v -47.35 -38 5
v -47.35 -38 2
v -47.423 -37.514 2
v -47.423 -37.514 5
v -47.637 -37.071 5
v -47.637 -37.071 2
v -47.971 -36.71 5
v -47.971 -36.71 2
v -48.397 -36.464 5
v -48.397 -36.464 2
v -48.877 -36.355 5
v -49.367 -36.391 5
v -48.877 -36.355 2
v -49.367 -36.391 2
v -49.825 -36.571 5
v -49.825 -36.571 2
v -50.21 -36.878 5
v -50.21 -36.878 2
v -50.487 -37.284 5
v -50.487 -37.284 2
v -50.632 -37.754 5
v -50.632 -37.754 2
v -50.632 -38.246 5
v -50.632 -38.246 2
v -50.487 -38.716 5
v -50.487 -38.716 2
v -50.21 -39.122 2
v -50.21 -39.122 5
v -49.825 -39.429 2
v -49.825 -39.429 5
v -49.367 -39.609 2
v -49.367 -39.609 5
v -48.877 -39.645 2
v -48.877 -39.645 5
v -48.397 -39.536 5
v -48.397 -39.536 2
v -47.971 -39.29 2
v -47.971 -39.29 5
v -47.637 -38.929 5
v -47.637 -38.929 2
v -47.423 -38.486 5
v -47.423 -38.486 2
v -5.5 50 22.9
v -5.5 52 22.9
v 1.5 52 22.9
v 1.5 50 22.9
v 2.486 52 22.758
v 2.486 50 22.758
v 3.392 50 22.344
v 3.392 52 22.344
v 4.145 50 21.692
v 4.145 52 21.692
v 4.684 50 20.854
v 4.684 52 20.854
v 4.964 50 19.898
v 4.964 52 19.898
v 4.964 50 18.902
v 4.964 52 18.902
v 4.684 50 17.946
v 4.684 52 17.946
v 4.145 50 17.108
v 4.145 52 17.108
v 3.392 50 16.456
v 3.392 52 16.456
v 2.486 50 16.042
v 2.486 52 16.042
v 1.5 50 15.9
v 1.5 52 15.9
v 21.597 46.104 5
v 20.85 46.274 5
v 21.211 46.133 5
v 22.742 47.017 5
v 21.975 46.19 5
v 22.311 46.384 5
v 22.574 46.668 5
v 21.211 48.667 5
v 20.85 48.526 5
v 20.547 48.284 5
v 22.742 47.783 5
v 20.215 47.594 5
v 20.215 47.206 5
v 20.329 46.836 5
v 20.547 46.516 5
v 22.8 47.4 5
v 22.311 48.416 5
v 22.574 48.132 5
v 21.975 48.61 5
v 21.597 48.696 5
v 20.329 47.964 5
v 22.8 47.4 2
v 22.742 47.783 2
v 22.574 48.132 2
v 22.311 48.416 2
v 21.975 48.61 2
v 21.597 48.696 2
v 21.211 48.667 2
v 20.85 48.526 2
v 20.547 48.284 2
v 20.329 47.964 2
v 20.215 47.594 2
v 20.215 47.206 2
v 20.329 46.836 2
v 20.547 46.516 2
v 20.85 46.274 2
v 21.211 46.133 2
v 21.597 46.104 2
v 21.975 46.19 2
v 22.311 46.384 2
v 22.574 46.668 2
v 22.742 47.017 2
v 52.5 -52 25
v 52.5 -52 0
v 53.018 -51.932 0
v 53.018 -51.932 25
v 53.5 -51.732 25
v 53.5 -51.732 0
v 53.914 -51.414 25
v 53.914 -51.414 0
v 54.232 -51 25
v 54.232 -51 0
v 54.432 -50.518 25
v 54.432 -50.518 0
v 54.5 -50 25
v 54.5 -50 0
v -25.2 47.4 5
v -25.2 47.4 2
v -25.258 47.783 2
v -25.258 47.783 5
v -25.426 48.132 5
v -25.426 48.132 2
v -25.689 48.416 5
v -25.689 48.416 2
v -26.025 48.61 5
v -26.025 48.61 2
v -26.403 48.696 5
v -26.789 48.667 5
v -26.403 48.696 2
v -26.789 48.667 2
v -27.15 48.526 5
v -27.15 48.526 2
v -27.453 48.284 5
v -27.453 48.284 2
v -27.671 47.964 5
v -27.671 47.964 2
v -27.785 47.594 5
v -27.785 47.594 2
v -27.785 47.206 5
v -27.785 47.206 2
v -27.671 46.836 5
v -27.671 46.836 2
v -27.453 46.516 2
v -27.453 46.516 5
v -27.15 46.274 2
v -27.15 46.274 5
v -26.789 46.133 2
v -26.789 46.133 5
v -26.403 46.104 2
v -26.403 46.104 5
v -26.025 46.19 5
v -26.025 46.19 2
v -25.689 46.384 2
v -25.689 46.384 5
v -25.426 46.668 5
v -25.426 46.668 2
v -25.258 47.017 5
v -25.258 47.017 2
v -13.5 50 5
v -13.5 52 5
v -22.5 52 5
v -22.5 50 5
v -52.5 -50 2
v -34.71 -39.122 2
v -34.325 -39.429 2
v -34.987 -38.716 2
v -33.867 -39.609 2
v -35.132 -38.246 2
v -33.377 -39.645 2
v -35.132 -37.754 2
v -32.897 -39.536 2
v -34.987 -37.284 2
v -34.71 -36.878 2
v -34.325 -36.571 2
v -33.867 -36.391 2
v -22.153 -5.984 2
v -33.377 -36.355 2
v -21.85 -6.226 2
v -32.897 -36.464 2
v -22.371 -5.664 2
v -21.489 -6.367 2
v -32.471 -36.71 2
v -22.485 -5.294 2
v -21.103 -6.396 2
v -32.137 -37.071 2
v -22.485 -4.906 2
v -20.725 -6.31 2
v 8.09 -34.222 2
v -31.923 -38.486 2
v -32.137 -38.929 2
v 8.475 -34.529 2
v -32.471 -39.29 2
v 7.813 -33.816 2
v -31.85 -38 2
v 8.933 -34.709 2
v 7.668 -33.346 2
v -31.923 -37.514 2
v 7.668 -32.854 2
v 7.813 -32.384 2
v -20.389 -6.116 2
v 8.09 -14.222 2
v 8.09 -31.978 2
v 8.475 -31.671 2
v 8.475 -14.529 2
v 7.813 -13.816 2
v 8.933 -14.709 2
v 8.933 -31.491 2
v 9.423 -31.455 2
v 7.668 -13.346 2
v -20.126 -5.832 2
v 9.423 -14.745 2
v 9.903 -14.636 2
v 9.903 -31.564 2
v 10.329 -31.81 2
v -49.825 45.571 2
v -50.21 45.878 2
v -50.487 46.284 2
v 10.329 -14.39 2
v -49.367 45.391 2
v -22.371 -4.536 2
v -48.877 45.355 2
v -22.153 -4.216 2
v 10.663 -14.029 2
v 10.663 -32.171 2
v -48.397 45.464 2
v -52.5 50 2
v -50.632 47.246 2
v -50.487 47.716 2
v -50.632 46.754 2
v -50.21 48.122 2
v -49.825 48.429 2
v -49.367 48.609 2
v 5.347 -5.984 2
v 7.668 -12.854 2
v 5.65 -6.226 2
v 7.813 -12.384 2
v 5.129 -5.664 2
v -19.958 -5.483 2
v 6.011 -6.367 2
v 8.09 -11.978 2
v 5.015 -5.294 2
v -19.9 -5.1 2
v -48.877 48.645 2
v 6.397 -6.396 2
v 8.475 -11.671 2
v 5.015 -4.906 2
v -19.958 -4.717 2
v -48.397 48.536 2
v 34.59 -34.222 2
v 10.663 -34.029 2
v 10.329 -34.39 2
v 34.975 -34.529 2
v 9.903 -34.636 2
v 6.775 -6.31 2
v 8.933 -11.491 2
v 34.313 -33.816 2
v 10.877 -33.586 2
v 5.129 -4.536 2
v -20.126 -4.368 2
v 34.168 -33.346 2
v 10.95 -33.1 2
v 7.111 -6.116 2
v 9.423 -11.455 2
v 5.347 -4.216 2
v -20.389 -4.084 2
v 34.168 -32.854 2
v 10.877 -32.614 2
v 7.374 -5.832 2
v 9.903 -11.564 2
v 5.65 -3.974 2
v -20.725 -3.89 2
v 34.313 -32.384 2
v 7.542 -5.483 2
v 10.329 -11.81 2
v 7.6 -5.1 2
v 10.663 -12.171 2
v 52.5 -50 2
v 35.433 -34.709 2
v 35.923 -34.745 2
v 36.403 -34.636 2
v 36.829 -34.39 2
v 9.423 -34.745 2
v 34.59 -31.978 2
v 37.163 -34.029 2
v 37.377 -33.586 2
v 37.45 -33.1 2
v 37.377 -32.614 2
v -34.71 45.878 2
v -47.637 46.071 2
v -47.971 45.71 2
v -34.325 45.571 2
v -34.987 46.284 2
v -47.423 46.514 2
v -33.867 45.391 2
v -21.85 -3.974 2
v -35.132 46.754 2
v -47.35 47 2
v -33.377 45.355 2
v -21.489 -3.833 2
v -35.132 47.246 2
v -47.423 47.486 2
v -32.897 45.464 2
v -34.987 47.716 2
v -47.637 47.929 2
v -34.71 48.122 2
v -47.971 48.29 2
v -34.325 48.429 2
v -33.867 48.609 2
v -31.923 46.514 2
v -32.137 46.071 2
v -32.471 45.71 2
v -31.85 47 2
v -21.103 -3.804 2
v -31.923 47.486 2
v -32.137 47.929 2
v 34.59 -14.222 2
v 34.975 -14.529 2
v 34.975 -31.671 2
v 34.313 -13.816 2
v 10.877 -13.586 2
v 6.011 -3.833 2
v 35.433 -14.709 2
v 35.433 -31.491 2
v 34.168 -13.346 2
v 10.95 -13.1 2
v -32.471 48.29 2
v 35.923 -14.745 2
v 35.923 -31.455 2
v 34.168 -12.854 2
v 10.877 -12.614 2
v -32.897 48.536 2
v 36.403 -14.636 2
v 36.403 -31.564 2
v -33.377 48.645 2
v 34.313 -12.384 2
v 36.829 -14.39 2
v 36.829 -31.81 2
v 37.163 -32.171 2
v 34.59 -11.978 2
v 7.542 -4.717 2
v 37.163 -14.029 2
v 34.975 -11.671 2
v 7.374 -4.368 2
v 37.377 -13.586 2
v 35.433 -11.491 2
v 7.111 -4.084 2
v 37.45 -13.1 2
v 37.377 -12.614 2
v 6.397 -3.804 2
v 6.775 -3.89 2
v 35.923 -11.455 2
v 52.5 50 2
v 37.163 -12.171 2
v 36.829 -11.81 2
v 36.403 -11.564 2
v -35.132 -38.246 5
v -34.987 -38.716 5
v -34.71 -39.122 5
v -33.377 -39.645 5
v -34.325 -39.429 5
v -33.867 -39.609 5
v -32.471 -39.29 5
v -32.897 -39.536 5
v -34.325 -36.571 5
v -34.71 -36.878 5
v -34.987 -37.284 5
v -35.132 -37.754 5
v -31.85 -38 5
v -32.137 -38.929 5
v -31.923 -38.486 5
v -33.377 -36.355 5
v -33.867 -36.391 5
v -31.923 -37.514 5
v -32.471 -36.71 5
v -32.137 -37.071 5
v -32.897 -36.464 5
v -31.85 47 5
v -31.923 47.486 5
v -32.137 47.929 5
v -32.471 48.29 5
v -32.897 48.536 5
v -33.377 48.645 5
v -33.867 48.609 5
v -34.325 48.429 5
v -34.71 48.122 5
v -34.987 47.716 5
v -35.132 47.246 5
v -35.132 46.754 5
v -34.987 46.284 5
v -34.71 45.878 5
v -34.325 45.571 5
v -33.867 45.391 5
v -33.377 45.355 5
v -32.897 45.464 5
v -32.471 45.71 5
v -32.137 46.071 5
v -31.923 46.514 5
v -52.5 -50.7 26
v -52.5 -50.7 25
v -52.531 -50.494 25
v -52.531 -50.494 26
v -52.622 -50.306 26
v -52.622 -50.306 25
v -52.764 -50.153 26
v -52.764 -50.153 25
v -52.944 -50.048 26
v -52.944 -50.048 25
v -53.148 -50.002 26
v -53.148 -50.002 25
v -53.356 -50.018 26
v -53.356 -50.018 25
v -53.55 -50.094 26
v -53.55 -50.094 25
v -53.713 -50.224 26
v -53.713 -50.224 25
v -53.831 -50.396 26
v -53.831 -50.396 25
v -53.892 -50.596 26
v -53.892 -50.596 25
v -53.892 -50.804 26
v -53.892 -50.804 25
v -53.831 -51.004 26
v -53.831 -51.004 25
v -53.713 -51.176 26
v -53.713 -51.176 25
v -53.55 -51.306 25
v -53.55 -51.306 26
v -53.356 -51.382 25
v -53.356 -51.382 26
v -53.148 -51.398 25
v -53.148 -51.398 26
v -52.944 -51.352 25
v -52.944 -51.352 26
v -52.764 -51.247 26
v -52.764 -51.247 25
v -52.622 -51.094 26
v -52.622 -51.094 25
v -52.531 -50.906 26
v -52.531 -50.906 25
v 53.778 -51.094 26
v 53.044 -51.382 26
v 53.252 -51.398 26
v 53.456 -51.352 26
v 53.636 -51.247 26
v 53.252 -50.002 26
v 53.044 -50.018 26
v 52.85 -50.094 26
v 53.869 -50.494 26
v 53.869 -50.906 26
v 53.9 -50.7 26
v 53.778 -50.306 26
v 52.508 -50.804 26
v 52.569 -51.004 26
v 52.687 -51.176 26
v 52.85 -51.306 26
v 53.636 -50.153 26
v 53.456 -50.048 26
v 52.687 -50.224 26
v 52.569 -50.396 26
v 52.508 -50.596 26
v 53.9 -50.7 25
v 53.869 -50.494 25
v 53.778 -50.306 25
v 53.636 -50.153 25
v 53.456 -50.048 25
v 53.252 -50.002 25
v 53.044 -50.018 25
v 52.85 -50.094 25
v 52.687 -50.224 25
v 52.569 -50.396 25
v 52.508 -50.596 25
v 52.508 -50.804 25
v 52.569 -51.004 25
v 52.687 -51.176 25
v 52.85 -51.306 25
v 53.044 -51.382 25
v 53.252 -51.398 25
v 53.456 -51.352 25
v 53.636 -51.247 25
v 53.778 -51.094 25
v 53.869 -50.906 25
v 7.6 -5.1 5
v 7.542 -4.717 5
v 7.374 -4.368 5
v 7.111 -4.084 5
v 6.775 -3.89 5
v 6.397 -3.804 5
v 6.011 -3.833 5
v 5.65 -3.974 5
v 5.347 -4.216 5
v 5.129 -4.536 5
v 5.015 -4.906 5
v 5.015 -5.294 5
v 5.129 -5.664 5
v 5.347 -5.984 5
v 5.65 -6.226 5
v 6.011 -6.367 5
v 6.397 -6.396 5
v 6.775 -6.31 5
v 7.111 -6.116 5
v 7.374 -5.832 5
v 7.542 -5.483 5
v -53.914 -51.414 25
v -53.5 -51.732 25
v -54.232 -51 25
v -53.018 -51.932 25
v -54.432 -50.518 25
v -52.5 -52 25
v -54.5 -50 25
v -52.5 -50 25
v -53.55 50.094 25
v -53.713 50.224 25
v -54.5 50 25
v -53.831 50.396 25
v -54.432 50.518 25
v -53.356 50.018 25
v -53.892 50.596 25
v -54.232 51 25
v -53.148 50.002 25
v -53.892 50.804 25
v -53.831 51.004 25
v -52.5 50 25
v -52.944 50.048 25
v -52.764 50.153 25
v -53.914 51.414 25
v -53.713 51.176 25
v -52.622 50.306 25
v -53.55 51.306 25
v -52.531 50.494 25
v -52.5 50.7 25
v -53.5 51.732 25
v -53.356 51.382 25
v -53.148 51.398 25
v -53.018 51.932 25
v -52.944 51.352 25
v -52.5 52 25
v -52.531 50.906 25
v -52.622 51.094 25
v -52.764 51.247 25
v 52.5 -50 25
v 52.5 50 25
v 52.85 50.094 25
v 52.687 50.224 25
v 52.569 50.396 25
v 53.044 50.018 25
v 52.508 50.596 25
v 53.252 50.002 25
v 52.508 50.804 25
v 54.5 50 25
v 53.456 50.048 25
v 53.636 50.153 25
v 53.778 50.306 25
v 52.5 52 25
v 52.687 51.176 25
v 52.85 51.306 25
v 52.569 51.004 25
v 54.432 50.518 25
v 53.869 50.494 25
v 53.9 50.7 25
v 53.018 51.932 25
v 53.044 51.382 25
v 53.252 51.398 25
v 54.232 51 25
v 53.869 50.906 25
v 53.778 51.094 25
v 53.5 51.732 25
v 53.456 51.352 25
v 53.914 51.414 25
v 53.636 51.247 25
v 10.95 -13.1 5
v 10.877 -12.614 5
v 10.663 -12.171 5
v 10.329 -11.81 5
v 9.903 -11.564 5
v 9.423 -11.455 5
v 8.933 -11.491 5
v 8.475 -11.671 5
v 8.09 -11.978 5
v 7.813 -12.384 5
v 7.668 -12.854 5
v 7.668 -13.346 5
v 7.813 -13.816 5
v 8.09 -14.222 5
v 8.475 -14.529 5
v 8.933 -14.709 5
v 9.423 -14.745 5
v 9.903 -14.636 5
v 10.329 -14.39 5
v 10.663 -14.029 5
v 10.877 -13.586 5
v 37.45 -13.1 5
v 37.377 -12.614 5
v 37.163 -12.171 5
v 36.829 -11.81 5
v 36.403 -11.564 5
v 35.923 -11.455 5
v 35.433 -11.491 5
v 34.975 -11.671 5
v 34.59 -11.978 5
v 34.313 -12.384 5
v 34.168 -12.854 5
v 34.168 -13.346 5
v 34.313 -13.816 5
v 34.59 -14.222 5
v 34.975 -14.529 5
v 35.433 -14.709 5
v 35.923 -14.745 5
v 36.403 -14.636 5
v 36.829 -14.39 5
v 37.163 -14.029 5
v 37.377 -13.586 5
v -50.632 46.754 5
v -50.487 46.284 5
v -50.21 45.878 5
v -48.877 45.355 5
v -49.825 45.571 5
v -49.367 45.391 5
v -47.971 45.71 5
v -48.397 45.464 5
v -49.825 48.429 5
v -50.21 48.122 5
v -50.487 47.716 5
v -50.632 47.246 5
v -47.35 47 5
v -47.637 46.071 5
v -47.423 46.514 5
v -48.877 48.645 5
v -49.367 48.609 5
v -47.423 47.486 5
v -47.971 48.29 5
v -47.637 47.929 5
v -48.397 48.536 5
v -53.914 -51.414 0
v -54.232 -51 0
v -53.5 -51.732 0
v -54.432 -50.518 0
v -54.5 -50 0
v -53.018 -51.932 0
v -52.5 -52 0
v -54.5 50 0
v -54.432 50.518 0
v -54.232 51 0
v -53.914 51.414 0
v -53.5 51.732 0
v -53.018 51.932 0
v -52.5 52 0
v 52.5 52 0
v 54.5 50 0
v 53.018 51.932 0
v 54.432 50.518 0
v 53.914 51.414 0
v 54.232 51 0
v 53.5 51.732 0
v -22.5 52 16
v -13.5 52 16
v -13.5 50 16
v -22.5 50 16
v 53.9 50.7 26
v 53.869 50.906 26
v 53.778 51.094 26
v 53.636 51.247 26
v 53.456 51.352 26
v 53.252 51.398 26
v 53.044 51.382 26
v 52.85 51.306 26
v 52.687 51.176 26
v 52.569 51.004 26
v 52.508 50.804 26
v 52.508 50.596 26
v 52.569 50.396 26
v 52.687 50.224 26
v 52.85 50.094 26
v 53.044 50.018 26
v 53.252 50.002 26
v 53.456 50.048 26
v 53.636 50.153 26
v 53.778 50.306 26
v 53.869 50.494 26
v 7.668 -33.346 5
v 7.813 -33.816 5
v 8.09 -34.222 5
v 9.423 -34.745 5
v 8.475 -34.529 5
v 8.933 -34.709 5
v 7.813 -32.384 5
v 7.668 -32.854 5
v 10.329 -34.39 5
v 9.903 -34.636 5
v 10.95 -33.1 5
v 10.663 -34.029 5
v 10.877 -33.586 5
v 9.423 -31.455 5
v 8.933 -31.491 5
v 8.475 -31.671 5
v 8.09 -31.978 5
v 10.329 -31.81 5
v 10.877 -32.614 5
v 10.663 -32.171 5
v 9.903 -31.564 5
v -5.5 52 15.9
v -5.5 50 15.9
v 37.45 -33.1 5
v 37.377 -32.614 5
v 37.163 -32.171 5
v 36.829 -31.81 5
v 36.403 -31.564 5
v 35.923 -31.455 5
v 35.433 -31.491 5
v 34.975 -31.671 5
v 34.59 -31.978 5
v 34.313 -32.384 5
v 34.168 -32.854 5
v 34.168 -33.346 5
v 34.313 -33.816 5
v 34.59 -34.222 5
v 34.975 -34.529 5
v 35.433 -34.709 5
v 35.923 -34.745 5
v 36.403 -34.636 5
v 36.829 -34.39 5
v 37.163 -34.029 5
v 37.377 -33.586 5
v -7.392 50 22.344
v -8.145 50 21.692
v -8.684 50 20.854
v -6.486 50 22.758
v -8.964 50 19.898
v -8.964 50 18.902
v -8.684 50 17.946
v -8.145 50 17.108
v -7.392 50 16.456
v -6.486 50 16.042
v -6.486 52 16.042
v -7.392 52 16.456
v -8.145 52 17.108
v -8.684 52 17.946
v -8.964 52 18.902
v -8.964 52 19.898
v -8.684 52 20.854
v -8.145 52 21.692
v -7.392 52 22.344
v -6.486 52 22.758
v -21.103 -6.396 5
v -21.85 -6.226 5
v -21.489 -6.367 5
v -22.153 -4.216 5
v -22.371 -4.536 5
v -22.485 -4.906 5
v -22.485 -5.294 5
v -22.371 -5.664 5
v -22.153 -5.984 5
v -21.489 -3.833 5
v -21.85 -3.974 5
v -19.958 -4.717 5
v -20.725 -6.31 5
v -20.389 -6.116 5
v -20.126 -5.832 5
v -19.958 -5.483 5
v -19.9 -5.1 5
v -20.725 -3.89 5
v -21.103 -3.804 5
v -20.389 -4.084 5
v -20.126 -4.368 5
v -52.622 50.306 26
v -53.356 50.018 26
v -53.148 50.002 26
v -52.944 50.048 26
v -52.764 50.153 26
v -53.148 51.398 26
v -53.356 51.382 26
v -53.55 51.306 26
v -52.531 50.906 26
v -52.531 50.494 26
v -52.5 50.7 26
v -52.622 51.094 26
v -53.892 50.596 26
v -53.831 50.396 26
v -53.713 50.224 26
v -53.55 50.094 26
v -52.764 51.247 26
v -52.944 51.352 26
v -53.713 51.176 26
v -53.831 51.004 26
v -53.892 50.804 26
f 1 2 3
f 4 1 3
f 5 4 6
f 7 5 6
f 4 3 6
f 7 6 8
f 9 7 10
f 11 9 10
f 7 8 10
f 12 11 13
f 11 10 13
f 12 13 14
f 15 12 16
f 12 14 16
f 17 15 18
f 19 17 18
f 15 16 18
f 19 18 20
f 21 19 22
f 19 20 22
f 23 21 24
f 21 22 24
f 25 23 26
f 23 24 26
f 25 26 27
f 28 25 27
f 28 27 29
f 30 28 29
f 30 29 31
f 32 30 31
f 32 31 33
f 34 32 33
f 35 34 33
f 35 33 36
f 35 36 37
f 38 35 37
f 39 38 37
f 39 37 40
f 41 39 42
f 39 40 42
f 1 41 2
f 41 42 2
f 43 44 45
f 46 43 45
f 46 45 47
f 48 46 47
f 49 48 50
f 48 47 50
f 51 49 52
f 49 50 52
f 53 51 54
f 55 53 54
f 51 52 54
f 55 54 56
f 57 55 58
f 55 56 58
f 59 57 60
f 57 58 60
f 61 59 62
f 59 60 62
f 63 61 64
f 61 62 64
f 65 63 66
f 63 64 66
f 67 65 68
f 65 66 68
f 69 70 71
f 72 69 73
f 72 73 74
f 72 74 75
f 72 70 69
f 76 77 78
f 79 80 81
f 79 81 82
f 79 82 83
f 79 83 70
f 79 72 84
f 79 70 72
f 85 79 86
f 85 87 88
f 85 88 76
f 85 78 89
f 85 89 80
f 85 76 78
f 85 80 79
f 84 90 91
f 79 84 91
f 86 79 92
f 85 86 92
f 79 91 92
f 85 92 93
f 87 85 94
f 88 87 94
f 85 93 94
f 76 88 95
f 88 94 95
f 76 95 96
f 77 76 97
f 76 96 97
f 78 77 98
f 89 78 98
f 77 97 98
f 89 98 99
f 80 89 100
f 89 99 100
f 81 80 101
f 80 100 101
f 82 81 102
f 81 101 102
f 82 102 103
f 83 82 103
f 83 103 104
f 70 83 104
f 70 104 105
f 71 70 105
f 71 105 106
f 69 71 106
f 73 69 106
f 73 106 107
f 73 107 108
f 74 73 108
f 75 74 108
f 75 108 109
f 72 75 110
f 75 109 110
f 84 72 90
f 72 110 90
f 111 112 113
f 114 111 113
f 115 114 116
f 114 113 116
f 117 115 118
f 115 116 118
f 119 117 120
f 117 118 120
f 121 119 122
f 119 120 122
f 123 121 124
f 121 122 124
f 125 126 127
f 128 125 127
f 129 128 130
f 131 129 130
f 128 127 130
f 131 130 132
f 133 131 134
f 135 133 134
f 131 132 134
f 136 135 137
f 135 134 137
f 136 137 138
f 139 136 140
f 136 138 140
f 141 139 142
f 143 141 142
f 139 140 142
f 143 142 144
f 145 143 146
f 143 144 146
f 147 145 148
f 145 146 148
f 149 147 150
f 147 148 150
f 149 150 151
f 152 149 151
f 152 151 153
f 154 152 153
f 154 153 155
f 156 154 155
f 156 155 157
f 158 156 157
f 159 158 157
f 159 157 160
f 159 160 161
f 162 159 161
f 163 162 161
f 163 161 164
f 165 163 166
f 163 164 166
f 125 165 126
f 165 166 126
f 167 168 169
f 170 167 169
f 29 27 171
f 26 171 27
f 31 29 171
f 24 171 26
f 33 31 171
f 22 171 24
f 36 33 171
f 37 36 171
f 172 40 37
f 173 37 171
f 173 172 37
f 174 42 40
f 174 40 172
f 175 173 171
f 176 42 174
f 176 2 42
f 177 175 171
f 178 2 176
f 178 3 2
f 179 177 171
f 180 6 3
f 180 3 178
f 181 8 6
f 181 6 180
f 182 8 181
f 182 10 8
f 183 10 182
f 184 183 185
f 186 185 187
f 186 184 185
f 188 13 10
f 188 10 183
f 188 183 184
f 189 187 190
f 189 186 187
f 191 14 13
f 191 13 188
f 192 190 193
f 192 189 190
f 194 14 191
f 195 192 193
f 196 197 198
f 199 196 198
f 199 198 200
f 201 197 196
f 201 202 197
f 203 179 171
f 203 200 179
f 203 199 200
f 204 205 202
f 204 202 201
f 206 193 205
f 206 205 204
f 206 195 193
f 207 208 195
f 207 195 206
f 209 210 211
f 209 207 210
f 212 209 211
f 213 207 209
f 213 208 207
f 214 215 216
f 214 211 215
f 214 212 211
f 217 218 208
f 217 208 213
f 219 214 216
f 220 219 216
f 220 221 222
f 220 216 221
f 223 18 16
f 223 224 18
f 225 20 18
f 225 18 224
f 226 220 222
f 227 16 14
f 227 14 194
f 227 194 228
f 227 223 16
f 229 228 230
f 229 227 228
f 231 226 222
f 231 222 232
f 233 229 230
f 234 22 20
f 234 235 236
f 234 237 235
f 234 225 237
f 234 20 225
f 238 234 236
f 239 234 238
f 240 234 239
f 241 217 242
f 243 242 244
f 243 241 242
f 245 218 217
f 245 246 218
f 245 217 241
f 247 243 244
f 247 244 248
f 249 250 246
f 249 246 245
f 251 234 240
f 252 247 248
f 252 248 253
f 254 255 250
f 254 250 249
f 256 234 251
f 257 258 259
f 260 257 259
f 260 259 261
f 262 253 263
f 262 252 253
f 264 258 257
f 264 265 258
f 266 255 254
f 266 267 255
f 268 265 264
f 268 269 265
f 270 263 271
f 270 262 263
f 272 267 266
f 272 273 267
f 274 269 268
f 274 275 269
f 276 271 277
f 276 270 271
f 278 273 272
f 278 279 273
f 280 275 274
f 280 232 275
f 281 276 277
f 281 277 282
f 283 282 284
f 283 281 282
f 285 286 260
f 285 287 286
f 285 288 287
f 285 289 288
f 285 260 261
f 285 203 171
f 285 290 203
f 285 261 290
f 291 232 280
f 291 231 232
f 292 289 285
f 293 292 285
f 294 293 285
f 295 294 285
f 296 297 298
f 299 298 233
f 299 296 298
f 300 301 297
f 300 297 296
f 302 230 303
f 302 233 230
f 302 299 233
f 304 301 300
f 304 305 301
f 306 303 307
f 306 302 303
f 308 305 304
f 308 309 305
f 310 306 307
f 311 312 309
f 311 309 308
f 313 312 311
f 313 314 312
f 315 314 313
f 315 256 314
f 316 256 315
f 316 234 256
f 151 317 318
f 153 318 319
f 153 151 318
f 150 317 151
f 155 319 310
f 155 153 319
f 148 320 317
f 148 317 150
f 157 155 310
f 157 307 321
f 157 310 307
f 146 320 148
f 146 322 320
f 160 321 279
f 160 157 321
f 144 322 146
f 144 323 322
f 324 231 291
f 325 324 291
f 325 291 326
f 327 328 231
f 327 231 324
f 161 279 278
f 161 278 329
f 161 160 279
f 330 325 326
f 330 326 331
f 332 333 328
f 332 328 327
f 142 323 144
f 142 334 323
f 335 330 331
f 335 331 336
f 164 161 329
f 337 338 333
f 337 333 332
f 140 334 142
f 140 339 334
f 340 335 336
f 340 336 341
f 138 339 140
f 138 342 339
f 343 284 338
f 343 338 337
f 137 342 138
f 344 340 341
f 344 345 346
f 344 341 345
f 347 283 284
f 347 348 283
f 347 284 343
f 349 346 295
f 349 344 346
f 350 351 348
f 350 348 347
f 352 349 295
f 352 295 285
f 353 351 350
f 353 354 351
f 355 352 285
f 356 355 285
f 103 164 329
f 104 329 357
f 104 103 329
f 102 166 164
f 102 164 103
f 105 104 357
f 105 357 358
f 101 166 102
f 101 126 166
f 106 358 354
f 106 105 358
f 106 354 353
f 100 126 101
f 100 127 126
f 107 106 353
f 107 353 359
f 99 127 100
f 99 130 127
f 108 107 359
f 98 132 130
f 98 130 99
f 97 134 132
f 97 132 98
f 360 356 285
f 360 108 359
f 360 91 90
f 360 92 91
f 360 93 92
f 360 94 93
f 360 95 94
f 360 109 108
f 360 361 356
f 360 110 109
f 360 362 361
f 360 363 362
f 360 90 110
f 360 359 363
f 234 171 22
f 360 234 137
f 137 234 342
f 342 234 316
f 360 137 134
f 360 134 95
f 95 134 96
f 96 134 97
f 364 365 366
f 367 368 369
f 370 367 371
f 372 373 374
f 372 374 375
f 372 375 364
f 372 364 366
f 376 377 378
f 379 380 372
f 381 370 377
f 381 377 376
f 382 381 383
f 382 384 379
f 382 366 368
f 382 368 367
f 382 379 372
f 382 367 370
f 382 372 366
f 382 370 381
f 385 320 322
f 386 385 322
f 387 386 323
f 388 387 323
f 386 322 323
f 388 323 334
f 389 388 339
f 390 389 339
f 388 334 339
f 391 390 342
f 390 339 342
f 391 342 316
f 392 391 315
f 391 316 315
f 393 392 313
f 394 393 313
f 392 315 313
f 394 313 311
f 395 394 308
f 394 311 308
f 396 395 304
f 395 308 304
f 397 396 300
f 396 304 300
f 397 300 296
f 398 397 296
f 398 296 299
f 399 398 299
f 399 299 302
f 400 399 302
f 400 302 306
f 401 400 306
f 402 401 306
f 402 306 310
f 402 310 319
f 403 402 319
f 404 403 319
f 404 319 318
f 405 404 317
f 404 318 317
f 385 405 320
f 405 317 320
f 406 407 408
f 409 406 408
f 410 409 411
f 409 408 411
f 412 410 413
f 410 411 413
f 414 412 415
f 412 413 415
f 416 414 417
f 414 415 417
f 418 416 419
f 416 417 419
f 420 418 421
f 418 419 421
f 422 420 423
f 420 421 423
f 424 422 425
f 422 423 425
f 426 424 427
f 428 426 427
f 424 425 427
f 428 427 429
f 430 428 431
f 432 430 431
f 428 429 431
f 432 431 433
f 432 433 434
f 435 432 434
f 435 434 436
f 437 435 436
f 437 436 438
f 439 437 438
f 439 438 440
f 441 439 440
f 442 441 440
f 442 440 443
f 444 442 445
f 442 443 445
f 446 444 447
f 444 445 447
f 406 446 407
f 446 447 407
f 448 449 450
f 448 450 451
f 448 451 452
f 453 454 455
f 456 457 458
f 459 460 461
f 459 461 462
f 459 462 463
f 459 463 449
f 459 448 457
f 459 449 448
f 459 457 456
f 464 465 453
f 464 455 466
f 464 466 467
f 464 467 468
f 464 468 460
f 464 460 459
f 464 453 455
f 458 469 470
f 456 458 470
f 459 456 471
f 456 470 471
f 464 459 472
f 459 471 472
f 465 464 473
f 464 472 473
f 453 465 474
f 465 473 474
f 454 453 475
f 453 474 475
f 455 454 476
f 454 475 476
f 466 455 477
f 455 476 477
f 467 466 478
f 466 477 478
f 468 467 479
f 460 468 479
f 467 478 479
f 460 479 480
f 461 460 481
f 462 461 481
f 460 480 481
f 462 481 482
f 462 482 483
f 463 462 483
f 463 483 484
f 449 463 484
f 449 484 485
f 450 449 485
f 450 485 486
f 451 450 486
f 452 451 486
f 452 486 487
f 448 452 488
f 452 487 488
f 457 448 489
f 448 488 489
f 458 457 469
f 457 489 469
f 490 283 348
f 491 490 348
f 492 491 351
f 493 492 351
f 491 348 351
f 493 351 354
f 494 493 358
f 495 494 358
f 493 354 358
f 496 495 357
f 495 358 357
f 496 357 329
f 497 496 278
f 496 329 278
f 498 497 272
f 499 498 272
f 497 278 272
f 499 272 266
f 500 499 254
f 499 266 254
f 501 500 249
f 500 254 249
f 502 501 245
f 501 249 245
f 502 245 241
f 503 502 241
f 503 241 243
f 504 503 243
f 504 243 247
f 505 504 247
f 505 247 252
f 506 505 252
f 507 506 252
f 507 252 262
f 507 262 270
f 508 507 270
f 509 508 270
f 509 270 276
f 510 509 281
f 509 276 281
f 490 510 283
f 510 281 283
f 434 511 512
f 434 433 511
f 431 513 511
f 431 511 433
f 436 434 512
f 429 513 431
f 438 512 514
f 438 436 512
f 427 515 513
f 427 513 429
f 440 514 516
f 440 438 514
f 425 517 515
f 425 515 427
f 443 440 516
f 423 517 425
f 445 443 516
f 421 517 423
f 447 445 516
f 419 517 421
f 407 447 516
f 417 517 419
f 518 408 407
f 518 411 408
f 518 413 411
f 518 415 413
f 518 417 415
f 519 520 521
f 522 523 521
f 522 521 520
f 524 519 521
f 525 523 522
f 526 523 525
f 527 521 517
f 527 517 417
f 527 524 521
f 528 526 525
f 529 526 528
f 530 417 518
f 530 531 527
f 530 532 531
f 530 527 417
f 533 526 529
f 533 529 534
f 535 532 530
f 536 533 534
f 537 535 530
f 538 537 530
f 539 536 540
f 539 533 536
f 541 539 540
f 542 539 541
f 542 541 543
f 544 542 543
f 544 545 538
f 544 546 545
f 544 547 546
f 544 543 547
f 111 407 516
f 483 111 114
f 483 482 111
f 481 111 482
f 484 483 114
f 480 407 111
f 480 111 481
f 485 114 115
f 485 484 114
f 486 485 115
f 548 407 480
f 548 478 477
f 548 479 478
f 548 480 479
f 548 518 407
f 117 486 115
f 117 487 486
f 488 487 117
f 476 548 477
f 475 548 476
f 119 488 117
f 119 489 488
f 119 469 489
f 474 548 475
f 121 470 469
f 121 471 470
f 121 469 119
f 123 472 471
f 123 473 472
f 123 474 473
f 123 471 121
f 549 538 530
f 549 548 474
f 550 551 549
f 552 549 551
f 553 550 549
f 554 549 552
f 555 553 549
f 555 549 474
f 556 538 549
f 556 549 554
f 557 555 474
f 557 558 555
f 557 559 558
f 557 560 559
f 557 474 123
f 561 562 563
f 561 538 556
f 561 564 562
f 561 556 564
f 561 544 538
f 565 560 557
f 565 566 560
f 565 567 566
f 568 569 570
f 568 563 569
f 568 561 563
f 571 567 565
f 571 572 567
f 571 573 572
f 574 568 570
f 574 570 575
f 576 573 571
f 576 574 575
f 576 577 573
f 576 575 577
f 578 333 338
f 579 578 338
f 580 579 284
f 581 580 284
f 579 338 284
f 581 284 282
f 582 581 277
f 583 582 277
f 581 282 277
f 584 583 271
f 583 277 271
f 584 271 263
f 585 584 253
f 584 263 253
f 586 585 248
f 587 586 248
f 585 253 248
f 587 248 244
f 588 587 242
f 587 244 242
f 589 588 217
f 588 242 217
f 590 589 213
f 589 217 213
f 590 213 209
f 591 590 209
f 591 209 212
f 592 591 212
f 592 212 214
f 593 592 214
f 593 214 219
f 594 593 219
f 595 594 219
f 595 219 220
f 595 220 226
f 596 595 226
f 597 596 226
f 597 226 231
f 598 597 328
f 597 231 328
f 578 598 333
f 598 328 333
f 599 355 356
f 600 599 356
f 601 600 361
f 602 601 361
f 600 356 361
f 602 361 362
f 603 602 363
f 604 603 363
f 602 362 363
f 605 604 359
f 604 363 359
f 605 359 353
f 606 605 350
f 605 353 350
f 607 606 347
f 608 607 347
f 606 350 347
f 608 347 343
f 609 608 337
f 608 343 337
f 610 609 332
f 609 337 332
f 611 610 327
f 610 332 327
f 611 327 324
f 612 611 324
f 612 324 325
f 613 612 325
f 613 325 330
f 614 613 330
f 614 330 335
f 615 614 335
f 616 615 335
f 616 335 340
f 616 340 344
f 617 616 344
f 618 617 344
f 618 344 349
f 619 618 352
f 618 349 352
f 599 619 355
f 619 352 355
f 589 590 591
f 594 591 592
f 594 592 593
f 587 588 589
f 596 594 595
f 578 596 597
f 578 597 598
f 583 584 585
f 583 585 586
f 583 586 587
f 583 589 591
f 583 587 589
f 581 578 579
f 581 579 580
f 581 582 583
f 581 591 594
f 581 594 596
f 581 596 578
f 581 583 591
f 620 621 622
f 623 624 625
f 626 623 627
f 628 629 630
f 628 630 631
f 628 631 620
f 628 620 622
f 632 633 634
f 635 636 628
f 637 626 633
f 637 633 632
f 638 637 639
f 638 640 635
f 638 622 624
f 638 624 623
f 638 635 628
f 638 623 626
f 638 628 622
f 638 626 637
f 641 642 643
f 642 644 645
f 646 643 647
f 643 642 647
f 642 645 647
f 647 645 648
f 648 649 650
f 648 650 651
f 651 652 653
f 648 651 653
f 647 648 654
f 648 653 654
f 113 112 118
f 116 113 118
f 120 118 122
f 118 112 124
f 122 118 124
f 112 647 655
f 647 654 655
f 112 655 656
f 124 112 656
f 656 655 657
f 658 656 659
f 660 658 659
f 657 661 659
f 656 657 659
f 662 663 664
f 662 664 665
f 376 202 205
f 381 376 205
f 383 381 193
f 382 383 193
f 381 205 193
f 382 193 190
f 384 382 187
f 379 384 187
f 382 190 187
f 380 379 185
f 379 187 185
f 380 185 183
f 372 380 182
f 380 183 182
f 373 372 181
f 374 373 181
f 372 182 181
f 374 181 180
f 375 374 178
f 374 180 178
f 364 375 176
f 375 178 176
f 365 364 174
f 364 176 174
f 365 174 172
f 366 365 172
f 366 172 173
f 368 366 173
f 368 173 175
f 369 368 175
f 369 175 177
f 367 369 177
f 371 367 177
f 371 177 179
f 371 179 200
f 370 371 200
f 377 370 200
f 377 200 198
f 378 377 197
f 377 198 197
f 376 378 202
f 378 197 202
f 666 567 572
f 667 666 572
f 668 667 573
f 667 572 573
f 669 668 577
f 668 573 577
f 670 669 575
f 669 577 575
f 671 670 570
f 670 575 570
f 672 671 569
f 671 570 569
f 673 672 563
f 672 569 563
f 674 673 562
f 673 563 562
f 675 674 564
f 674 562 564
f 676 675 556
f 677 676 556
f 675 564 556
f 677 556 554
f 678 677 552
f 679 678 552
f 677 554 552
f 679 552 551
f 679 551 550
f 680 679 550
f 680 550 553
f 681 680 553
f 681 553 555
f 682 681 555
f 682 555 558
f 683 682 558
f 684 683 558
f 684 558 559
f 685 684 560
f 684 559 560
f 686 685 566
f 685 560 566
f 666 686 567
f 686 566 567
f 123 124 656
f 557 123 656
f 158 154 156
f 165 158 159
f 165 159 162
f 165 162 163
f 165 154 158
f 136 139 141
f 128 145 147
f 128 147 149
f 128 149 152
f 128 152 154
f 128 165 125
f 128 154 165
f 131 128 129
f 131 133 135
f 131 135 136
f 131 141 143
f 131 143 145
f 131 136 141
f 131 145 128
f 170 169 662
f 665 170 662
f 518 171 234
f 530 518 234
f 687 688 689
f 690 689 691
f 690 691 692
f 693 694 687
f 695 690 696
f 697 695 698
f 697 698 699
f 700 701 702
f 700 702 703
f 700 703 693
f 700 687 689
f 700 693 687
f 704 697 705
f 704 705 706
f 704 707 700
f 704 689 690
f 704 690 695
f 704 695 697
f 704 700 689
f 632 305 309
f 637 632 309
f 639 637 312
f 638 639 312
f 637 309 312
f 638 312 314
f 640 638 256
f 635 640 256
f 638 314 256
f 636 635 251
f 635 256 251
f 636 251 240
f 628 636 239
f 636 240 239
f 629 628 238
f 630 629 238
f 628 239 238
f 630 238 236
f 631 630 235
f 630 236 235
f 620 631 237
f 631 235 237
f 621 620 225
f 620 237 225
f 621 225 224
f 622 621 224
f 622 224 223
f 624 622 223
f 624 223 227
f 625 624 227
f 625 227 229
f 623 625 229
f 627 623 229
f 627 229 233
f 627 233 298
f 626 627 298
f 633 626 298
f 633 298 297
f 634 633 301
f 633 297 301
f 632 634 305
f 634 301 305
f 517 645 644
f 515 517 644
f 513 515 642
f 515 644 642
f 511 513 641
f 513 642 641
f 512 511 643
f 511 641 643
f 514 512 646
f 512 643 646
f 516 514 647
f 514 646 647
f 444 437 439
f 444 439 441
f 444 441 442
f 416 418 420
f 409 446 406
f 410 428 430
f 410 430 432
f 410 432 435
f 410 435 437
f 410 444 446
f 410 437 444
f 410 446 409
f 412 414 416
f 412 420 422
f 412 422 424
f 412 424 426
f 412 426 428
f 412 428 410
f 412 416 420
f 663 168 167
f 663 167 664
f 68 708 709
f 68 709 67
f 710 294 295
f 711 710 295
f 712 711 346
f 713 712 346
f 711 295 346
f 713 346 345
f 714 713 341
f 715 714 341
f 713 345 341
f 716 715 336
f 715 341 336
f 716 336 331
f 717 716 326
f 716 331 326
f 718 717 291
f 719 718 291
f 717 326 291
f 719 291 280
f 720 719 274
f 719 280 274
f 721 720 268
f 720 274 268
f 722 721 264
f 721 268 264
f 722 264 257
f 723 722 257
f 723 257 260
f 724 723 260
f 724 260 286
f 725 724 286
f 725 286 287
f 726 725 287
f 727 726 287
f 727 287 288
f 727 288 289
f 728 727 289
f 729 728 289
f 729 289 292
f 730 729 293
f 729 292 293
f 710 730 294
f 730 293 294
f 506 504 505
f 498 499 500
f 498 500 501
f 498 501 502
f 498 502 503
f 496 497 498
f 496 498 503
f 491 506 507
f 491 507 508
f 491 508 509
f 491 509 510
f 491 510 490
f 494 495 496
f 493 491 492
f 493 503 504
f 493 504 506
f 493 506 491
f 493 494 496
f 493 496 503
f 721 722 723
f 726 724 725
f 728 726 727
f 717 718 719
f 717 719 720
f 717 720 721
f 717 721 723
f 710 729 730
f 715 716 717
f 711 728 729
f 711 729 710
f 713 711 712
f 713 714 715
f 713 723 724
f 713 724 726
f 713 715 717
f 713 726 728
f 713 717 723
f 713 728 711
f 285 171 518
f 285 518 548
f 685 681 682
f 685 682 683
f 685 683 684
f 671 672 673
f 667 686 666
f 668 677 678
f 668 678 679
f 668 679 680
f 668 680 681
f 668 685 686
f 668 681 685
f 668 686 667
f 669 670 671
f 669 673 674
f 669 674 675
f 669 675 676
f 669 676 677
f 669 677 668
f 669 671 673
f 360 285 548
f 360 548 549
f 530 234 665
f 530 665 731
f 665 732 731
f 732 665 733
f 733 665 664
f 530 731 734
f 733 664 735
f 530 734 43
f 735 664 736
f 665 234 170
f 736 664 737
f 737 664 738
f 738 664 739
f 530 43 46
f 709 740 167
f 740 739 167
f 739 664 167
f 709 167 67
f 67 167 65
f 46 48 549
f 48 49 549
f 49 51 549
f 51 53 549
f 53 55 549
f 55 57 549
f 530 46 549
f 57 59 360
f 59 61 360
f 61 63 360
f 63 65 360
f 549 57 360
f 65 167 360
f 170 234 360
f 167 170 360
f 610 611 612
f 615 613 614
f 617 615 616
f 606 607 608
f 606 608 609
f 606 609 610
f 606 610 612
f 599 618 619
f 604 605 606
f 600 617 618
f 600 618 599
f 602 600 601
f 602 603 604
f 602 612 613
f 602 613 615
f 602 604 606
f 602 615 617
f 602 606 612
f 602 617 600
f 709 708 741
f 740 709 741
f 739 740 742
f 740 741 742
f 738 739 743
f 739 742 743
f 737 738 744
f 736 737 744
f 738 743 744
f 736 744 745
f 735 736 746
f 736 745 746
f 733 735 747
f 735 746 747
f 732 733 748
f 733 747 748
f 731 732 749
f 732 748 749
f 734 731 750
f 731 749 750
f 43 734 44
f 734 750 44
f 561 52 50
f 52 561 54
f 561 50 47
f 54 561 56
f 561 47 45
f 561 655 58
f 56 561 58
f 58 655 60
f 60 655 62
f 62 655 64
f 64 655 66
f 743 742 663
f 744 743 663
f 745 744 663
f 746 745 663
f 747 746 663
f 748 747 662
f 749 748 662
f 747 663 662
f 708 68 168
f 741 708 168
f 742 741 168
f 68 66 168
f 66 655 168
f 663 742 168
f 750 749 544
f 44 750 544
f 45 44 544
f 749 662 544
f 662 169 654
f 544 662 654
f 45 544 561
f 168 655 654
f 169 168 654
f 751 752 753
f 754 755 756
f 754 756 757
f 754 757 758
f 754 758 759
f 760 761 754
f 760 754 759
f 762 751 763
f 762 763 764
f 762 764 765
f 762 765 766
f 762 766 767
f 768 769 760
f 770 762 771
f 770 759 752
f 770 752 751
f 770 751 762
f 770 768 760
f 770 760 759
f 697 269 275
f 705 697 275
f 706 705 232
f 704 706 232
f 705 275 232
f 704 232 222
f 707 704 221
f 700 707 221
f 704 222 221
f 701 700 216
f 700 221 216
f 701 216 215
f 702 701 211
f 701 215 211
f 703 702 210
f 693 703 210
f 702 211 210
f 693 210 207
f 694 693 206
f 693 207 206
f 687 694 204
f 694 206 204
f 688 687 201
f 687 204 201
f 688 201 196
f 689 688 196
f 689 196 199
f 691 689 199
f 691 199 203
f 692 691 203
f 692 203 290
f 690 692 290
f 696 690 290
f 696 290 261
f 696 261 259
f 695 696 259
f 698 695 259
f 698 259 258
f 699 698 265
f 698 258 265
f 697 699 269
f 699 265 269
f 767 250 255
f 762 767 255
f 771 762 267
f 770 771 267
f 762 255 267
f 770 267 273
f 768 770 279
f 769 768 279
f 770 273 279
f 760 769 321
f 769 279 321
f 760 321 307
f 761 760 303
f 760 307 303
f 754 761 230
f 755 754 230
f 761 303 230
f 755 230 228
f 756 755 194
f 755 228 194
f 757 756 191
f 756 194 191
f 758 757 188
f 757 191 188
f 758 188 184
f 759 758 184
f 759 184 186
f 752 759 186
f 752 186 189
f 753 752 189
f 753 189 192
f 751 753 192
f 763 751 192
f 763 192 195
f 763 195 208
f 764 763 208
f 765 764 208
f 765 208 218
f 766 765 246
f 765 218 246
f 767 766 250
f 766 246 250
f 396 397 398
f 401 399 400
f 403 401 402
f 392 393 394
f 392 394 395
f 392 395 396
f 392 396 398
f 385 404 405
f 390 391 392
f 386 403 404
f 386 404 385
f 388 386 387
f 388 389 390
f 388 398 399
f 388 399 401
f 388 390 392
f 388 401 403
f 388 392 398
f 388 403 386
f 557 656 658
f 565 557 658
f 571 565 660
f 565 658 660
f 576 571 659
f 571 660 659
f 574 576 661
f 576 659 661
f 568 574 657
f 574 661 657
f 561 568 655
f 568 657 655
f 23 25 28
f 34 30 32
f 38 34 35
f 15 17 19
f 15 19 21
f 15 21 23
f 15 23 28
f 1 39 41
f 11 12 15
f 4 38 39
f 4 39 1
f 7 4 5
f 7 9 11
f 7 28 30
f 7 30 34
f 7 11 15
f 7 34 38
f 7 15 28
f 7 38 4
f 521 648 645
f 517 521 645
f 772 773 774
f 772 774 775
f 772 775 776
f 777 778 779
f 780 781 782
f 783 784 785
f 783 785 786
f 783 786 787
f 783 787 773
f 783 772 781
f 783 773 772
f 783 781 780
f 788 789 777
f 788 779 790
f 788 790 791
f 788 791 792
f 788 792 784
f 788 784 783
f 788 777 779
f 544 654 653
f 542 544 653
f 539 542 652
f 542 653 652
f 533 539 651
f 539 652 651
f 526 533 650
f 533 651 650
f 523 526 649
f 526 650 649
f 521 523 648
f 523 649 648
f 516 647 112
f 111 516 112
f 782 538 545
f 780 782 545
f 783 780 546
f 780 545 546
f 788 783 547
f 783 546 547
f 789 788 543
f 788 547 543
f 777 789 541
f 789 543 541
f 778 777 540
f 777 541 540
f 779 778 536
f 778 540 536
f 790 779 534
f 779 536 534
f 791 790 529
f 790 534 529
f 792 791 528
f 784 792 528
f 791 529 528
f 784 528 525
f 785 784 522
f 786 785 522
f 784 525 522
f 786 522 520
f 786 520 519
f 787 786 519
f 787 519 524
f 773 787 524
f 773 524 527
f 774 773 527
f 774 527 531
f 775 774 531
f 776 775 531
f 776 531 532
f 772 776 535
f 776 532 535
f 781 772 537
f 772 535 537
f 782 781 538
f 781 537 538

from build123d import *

# Parameters (mm, degrees)
SKETCH_W        = 105
SKETCH_H        = 100
PAD_DEPTH       = 25
PAD001_DEPTH    = 2
SKETCH003_W     = 9
SKETCH003_H     = 11
POCKET_DEPTH    = 5
POCKET001_DEPTH = 2
SKETCH007_R     = 0.7
PAD006_DEPTH    = 1
PAD007_DEPTH    = 2
SKETCH005_R     = 1.3
SKETCH005_R_2   = 1.65
PAD008_DEPTH    = 3


with BuildPart() as part:
    # Sketch → Pad (new body)
    with BuildSketch(Plane.XY):
        with BuildLine():
            Line((-54.5, 50), (-54.5, -50))
            ThreePointArc((-54.5, -50), (-53.914214, -51.414214), (-52.5, -52))
            Line((-52.5, -52), (52.5, -52))
            ThreePointArc((52.5, -52), (53.914214, -51.414214), (54.5, -50))
            Line((54.5, -50), (54.5, 50))
            ThreePointArc((54.5, 50), (53.914214, 51.414214), (52.5, 52))
            Line((52.5, 52), (-52.5, 52))
            ThreePointArc((-52.5, 52), (-53.914214, 51.414214), (-54.5, 50))
        make_face()
        Rectangle(SKETCH_W, SKETCH_H, mode=Mode.SUBTRACT)
    extrude(amount=PAD_DEPTH)

    # Sketch001 → Pad001 (join)
    with BuildSketch(Plane.XY):
        with BuildLine():
            Line((-54.5, 47), (-54.5, -47))
            ThreePointArc((-54.5, -47), (-53.035534, -50.535534), (-49.5, -52))
            Line((-49.5, -52), (49.5, -52))
            ThreePointArc((49.5, -52), (53.035534, -50.535534), (54.5, -47))
            Line((54.5, -47), (54.5, 47))
            ThreePointArc((54.5, 47), (53.035534, 50.535534), (49.5, 52))
            Line((49.5, 52), (-49.5, 52))
            ThreePointArc((-49.5, 52), (-53.035534, 50.535534), (-54.5, 47))
        make_face()
    extrude(amount=PAD001_DEPTH)

    # Sketch003 (on Face13 of Pad001) → Pocket (cut)
    with BuildSketch(Plane(origin=(0, 52, 0), x_dir=(-1, 0, 0), z_dir=(0, 1, 0))):
        with Locations((18.000214, 10.5)):
            Rectangle(SKETCH003_W, SKETCH003_H)
    extrude(amount=-POCKET_DEPTH, mode=Mode.SUBTRACT)

    # Sketch004 (on Face8 of Pocket) → Pocket001 (cut)
    with BuildSketch(Plane(origin=(0, 52, 0), x_dir=(-1, 0, 0), z_dir=(0, 1, 0))):
        with BuildLine():
            ThreePointArc((5.5, 15.9), (9, 19.4), (5.5, 22.9))
            Line((5.5, 22.9), (-1.5, 22.9))
            ThreePointArc((-1.5, 22.9), (-5, 19.4), (-1.5, 15.9))
            Line((5.5, 15.9), (-1.5, 15.9))
        make_face()
    extrude(amount=-POCKET001_DEPTH, mode=Mode.SUBTRACT)

    # Sketch007 → Pad006 (join)
    with BuildSketch(Plane.XY.offset(25)):
        with Locations((53.200001, 50.700001)):
            Circle(SKETCH007_R)
        with Locations((-53.200001, 50.700001)):
            Circle(SKETCH007_R)
        with Locations((-53.200001, -50.700001)):
            Circle(SKETCH007_R)
        with Locations((53.200001, -50.700001)):
            Circle(SKETCH007_R)
    extrude(amount=PAD006_DEPTH)

    # Sketch001 → Pad007 (join)
    with BuildSketch(Plane.XY):
        with BuildLine():
            Line((-54.5, 47), (-54.5, -47))
            ThreePointArc((-54.5, -47), (-53.035534, -50.535534), (-49.5, -52))
            Line((-49.5, -52), (49.5, -52))
            ThreePointArc((49.5, -52), (53.035534, -50.535534), (54.5, -47))
            Line((54.5, -47), (54.5, 47))
            ThreePointArc((54.5, 47), (53.035534, 50.535534), (49.5, 52))
            Line((49.5, 52), (-49.5, 52))
            ThreePointArc((-49.5, 52), (-53.035534, 50.535534), (-54.5, 47))
        make_face()
    extrude(amount=PAD007_DEPTH)

    # Sketch005 (on Face23 of Pocket001) → Pad008 (join)
    with BuildSketch(Plane.XY.offset(2)):
        with Locations((-26.500001, 47.400001)):
            Circle(SKETCH005_R)
        with Locations((-33.500001, 47.000001)):
            Circle(SKETCH005_R_2)
        with Locations((-49.000001, 47.000001)):
            Circle(SKETCH005_R_2)
        with Locations((-49.000001, -37.999999)):
            Circle(SKETCH005_R_2)
        with Locations((-33.500001, -37.999999)):
            Circle(SKETCH005_R_2)
        with Locations((21.499999, 47.400001)):
            Circle(SKETCH005_R)
        with Locations((-21.200001, -5.099999)):
            Circle(SKETCH005_R)
        with Locations((6.299999, -5.099999)):
            Circle(SKETCH005_R)
        with Locations((9.299999, -13.099999)):
            Circle(SKETCH005_R_2)
        with Locations((35.799999, -13.099999)):
            Circle(SKETCH005_R_2)
        with Locations((9.299999, -33.099999)):
            Circle(SKETCH005_R_2)
        with Locations((35.799999, -33.099999)):
            Circle(SKETCH005_R_2)
    extrude(amount=PAD008_DEPTH)


solid = part.part
